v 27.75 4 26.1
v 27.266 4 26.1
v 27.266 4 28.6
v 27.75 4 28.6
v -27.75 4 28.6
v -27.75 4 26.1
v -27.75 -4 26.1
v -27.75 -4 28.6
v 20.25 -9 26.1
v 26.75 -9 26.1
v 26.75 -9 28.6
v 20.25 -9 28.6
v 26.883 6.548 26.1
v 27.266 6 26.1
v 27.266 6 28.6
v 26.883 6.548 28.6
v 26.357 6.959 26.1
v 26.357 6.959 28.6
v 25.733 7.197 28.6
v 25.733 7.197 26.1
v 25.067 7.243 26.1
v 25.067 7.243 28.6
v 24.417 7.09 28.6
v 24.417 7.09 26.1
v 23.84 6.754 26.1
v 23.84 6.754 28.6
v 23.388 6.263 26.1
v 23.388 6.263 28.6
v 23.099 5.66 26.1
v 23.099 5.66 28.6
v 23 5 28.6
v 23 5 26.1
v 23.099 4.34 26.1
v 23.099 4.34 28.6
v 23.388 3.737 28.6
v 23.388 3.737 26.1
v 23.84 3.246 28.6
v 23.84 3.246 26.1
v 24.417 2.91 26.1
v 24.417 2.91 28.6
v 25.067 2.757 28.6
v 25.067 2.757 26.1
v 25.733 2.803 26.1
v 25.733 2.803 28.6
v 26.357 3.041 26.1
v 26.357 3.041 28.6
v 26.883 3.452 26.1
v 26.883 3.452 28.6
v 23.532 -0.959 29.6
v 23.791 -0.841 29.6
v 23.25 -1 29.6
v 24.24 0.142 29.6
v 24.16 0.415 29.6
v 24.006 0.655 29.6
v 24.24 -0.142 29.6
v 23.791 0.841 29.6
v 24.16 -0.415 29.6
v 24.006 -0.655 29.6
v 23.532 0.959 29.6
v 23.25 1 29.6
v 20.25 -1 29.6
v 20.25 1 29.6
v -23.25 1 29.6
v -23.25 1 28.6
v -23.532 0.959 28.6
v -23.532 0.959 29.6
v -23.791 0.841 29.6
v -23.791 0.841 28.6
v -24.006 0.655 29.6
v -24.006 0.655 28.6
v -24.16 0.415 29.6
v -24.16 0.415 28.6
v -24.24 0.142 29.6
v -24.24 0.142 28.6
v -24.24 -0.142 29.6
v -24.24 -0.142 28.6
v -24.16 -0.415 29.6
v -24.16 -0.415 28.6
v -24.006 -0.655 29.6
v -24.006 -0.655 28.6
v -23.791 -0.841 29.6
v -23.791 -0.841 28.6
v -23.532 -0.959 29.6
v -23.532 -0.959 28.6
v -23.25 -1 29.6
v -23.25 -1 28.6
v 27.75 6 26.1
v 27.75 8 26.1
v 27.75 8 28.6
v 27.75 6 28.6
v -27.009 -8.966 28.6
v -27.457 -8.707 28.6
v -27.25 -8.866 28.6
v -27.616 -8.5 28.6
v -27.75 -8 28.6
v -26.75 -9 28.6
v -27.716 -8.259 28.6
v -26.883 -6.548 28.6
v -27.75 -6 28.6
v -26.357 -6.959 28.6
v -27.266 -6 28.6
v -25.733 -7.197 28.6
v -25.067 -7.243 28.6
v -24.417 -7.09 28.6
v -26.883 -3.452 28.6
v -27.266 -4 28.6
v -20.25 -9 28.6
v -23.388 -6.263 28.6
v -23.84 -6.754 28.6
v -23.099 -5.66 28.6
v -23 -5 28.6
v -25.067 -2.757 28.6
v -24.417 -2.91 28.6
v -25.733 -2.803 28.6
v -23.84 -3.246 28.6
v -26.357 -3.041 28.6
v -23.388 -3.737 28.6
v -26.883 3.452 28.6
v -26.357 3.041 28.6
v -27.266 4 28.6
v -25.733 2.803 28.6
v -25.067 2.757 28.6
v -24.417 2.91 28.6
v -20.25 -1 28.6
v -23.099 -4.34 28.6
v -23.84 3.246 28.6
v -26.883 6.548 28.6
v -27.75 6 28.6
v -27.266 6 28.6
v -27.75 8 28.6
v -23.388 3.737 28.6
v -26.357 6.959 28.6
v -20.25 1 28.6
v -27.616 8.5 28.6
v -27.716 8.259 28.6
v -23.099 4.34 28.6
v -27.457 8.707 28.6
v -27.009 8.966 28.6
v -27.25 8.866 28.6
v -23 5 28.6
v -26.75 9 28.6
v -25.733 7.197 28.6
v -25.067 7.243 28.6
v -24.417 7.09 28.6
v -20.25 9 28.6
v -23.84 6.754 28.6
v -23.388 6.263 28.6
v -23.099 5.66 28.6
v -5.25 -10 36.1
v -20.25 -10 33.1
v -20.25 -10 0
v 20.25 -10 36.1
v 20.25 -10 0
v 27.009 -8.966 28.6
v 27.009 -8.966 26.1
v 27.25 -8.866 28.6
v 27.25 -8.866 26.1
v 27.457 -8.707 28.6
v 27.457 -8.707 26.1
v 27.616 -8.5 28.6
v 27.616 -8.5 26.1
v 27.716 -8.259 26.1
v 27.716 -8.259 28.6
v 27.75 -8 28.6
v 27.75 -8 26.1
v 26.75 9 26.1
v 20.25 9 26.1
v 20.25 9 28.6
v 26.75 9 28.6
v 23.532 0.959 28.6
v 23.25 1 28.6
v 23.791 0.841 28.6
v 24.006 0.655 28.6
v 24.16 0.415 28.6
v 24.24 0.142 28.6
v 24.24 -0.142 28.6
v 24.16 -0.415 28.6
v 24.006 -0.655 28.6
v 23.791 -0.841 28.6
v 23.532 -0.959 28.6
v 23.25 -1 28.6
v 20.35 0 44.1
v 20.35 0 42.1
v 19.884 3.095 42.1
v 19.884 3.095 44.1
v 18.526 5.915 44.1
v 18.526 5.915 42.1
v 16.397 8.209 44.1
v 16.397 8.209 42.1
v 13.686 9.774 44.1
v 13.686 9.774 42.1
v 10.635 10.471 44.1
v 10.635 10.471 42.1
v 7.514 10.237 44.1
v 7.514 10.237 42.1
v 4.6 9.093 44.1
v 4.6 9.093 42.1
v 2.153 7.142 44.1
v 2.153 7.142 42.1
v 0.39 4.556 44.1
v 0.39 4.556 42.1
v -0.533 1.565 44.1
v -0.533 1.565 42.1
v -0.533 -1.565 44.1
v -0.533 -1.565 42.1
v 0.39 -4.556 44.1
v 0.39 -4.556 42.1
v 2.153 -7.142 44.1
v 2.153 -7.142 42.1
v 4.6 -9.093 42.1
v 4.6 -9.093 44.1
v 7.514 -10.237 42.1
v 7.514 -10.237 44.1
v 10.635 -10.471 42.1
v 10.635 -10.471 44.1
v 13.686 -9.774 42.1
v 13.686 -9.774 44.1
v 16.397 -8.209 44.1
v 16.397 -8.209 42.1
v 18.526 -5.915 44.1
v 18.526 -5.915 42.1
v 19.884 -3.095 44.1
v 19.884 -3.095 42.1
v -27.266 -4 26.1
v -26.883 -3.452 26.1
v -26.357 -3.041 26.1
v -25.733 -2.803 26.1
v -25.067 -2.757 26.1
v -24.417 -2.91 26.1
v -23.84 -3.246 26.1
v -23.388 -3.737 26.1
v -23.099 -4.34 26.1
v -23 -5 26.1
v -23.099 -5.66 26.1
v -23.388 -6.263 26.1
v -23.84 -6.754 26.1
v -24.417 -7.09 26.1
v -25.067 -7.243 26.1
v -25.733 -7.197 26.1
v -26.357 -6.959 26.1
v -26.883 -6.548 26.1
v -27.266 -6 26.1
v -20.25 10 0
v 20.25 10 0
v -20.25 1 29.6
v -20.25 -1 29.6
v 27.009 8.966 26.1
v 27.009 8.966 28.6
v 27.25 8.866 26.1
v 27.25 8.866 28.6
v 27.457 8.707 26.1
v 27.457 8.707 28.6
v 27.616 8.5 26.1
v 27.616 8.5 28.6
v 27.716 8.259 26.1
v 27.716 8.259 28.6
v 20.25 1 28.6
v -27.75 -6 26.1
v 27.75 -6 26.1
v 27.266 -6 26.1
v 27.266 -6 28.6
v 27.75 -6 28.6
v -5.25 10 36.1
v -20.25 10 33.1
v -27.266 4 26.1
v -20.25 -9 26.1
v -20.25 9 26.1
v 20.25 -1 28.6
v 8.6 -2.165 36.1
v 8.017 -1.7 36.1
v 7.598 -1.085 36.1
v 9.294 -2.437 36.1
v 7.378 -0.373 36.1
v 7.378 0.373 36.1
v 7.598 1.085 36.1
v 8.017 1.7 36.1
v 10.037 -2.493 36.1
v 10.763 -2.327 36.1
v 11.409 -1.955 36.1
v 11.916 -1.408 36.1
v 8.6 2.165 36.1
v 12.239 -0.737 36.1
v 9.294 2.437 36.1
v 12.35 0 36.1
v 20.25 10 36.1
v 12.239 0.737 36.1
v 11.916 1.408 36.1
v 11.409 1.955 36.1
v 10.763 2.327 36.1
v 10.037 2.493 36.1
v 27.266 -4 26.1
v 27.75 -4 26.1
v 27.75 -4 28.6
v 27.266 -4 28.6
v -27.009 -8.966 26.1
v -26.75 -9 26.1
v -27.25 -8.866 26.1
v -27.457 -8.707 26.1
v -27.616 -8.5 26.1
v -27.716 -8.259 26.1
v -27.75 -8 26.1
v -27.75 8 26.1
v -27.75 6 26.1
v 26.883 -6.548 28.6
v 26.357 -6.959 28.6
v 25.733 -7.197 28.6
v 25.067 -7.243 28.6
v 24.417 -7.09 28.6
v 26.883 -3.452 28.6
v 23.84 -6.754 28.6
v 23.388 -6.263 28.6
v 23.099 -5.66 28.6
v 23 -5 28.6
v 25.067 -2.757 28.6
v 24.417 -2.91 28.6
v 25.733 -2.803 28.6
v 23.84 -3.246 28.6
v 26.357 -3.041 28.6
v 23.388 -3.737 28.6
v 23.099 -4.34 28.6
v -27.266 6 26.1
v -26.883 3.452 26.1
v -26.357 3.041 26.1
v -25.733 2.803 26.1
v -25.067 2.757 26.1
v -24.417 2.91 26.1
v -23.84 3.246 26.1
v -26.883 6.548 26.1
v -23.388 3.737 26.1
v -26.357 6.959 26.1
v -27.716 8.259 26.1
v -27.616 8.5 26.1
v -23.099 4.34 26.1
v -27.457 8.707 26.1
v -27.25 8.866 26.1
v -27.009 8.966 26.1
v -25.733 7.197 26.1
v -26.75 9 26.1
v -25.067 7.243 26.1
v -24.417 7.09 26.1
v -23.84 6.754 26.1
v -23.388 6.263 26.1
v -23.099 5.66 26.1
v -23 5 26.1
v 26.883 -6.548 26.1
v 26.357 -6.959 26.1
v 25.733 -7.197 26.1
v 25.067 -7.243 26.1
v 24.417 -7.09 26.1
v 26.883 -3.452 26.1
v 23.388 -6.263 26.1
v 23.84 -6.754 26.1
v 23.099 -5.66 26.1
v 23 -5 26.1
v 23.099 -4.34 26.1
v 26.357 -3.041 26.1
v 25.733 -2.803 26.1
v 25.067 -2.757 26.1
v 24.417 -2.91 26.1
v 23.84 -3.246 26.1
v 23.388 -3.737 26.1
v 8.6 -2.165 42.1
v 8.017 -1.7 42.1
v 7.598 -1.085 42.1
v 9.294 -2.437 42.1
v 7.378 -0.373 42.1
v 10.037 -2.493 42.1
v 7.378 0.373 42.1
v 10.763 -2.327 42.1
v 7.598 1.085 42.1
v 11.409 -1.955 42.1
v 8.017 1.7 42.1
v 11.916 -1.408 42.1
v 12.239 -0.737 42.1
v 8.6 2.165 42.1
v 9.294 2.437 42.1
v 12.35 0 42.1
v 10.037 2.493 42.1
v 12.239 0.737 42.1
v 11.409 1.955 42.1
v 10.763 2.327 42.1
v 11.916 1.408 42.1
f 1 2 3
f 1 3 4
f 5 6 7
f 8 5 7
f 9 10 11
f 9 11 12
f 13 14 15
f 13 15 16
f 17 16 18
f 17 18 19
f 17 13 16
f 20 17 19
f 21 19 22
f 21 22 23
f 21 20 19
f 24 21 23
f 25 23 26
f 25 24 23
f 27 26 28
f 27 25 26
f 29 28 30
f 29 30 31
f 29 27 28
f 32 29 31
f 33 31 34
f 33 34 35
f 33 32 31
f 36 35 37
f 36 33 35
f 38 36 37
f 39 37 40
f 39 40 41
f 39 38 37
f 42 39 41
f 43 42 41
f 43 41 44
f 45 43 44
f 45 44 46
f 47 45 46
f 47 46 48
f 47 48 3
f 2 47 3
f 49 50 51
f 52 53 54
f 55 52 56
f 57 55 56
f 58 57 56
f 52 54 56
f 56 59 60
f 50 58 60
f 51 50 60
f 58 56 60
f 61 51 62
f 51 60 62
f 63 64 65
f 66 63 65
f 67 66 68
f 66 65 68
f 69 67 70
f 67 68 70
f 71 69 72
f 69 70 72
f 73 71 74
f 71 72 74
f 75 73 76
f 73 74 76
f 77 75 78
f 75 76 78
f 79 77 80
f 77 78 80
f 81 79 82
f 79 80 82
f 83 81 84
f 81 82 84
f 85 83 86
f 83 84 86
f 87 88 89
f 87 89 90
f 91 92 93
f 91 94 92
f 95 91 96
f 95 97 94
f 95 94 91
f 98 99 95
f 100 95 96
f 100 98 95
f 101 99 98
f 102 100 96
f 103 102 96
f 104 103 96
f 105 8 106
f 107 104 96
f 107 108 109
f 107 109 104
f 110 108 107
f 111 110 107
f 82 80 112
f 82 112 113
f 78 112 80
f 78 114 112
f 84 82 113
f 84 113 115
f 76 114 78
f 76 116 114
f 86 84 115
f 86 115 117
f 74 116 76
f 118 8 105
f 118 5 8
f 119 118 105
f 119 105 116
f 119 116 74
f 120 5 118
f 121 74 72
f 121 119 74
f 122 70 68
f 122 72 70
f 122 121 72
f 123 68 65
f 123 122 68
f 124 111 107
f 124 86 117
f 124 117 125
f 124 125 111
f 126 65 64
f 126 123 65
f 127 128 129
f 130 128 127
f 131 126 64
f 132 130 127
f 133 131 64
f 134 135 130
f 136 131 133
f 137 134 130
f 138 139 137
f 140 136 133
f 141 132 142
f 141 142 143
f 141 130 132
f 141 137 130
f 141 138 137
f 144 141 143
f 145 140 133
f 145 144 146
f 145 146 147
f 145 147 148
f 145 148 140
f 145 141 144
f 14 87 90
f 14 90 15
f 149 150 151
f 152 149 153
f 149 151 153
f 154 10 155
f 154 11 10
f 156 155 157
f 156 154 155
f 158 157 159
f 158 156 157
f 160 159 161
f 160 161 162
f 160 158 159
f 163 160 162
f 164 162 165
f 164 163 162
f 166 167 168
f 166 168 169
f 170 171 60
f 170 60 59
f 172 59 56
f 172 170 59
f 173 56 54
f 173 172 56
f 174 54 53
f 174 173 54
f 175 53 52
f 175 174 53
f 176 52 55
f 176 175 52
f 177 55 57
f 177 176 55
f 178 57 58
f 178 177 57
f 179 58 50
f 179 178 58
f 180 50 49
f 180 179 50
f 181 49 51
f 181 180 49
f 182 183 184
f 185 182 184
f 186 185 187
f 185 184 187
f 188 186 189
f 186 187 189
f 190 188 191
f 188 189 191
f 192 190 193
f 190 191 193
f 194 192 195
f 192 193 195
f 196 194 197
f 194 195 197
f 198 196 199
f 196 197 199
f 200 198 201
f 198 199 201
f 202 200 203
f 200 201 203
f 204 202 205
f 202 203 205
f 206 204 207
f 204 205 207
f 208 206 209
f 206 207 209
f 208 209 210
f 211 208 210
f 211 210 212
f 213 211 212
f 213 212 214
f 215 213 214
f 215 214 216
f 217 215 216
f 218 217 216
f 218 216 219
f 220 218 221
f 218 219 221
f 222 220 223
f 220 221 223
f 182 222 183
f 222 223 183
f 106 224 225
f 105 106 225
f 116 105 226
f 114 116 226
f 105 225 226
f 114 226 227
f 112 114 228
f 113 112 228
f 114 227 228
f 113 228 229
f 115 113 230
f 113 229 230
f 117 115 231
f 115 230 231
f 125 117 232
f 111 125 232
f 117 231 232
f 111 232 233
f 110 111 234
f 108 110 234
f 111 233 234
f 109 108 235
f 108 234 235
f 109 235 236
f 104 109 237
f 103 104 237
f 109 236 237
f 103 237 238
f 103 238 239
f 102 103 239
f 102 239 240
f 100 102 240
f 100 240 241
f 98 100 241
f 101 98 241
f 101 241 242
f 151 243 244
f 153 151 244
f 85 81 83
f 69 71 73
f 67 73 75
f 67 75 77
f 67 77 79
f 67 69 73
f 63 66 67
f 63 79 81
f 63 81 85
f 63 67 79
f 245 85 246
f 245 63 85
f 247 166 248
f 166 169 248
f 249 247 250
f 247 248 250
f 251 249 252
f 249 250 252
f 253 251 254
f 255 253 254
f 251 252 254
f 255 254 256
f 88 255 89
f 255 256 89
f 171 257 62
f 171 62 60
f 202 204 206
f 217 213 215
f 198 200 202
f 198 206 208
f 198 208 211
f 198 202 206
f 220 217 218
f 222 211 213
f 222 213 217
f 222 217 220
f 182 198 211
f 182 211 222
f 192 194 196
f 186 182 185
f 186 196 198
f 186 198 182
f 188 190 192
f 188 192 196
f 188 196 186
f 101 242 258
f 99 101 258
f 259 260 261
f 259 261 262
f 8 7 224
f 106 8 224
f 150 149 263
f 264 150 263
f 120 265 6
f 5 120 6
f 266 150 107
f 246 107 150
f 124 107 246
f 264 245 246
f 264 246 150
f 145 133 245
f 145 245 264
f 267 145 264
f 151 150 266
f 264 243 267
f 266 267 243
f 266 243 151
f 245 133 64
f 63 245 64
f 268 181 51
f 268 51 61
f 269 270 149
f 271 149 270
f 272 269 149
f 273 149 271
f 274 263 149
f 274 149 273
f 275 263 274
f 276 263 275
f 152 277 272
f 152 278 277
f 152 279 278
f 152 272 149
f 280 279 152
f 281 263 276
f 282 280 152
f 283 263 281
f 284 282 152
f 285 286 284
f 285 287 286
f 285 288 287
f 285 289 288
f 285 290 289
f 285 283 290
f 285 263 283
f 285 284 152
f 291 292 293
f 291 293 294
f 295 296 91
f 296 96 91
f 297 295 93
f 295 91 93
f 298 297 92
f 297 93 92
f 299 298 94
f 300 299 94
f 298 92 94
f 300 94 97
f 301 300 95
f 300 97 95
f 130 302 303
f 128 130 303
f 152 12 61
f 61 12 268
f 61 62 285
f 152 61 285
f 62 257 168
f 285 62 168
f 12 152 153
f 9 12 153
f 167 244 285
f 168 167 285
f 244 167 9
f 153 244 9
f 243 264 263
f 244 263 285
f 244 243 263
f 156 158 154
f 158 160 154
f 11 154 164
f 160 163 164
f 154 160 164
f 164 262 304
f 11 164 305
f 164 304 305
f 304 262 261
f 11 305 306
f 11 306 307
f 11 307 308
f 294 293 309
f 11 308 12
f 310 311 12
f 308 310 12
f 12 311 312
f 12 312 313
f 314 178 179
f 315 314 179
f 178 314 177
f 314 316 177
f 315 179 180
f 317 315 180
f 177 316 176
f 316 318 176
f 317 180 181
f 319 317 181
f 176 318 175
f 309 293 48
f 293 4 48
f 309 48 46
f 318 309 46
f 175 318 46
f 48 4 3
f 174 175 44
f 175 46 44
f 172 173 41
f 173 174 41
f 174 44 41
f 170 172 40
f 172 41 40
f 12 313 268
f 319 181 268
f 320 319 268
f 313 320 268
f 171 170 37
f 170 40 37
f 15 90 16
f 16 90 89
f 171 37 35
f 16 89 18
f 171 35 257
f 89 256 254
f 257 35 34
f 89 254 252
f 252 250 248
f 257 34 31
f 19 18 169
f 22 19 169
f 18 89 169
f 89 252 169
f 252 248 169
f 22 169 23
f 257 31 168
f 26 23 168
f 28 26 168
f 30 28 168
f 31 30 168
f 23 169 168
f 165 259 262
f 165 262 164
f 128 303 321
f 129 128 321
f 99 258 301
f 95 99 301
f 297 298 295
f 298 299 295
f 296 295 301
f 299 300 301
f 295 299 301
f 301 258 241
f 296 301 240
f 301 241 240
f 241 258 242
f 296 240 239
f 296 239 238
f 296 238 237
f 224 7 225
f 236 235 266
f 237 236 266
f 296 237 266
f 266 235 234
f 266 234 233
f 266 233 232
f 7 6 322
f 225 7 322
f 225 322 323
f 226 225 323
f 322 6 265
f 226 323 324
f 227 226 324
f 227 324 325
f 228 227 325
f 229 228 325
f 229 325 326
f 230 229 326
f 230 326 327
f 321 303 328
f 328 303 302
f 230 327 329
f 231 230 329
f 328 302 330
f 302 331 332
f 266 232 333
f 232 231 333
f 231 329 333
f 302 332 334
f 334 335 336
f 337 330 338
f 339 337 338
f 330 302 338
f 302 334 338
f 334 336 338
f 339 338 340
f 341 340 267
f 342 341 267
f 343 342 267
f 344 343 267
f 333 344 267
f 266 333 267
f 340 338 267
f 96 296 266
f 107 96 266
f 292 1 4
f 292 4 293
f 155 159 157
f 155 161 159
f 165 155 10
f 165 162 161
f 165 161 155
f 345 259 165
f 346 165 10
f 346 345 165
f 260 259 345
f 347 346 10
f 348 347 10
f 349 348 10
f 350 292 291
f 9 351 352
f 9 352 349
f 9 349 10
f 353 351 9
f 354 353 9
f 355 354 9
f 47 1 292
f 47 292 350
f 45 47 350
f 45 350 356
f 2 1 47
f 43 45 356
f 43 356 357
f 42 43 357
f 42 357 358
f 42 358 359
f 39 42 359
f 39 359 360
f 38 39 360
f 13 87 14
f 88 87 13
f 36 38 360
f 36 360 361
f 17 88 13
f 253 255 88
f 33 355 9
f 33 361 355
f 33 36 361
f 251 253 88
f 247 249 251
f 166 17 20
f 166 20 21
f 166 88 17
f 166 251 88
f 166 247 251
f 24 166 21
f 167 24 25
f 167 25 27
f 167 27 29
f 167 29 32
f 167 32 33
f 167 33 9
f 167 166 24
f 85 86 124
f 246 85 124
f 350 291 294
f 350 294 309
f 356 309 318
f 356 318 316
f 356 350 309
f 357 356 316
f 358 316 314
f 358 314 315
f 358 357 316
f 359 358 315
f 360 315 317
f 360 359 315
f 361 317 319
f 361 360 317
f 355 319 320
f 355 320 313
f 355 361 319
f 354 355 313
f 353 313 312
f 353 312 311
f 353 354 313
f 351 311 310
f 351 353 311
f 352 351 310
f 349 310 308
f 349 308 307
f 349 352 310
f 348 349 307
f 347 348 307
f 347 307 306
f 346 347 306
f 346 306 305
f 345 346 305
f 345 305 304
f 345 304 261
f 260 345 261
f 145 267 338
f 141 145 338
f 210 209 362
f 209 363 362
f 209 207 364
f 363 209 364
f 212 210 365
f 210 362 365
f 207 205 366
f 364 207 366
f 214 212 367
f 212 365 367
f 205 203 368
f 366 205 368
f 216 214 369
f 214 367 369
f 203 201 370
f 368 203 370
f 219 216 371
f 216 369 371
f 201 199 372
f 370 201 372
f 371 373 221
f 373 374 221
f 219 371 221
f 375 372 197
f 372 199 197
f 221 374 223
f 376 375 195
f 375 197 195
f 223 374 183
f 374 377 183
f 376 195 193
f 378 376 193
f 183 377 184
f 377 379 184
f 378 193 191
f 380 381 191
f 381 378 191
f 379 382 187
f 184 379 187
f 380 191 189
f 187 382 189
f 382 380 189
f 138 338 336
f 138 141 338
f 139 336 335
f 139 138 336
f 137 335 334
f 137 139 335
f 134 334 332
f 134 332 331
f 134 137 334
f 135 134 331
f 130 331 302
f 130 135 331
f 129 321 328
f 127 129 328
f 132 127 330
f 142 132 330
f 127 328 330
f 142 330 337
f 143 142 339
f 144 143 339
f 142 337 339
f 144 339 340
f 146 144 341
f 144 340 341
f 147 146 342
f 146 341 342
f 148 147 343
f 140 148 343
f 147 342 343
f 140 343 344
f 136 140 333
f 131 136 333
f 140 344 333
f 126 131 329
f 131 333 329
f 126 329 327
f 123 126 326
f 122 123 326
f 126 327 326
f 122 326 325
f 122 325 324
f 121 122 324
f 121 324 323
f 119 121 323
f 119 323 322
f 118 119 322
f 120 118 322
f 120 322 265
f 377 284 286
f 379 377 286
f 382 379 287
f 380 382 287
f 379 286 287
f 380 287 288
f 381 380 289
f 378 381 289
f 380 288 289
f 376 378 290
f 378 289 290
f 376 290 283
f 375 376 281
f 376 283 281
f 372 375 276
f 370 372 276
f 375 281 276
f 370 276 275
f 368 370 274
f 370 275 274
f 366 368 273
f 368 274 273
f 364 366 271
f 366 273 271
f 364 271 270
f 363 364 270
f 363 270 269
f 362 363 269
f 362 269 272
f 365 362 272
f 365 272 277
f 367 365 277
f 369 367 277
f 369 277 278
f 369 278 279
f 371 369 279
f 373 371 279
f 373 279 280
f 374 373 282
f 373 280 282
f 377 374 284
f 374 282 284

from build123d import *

# Parameters (mm, degrees)
SKETCH1_W            = 40.5
SKETCH1_H            = 20
BOSS_EXTRUDE1_DEPTH  = 36.1
BOSS_EXTRUDE2_DEPTH  = 2.5
BOSS_EXTRUDE3_DEPTH  = 1
FILLET1_R            = 1
FILLET1_OF_MIRROR1_R = 1
CHAMFER1_SIZE        = 3
CHAMFER1_SIZE2       = 15
SKETCH4_R            = 2.5
BOSS_EXTRUDE4_DEPTH  = 6
SKETCH5_R            = 10.5
BOSS_EXTRUDE5_DEPTH  = 2


with BuildPart() as part:
    # Sketch1 → Boss-Extrude1 (new body)
    with BuildSketch(Plane.XY):
        Rectangle(SKETCH1_W, SKETCH1_H)
    extrude(amount=BOSS_EXTRUDE1_DEPTH)

    # Sketch2 → Boss-Extrude2 (add)
    with BuildSketch(Plane(origin=(0, 0, 26.1), x_dir=(-1, 0, 0), z_dir=(0, 0, -1))):
        with BuildLine():
            Line((-20.25, 9), (-27.75, 9))
            Line((-27.75, 9), (-27.75, 6))
            Line((-27.75, 6), (-27.265564437, 6))
            ThreePointArc((-27.265564437, 6), (-23, 5), (-27.265564437, 4))
            Line((-27.265564437, 4), (-27.75, 4))
            Line((-27.75, 4), (-27.75, -4))
            Line((-27.75, -4), (-27.265564437, -4))
            ThreePointArc((-27.265564437, -4), (-23, -5), (-27.265564437, -6))
            Line((-27.265564437, -6), (-27.75, -6))
            Line((-27.75, -6), (-27.75, -9))
            Line((-27.75, -9), (-20.25, -9))
            Line((-20.25, -9), (-20.25, 9))
        make_face()
    boss_extrude2 = extrude(amount=-BOSS_EXTRUDE2_DEPTH)

    # Sketch3 → Boss-Extrude3 (add)
    with BuildSketch(Plane.XY.offset(28.6)):
        with BuildLine():
            Line((20.25, 1), (23.25, 1))
            ThreePointArc((23.25, 1), (24.25, 0), (23.25, -1))
            Line((23.25, -1), (20.25, -1))
            Line((20.25, -1), (20.25, 1))
        make_face()
    boss_extrude3 = extrude(amount=BOSS_EXTRUDE3_DEPTH)

    # Fillet1
    fillet1_edges = [part.edges().sort_by_distance(p)[0] for p in [
        (27.75, -9, 27.35),
        (27.75, 9, 27.35),
    ]]
    fillet(fillet1_edges, radius=FILLET1_R)

    # Mirror1: Boss-Extrude2, Boss-Extrude3 across plane
    add(boss_extrude2.mirror(Plane(origin=(0, 0, 0), x_dir=(0, 0, 1), z_dir=(1, 0, 0))))
    add(boss_extrude3.mirror(Plane(origin=(0, 0, 0), x_dir=(0, 0, 1), z_dir=(1, 0, 0))))

    # Fillet1 of Mirror1
    fillet1_of_mirror1_edges = [part.edges().sort_by_distance(p)[0] for p in [
        (-27.75, -9, 27.35),
        (-27.75, 9, 27.35),
    ]]
    fillet(fillet1_of_mirror1_edges, radius=FILLET1_OF_MIRROR1_R)

    # Chamfer1
    chamfer1_edges = [part.edges().sort_by_distance(p)[0] for p in [
        (-20.25, 0, 36.1),
    ]]
    chamfer1_side = [part.faces().sort_by_distance(p)[0] for p in [
        (-20.25, 0, 17.397259259),
    ]]
    chamfer(chamfer1_edges, length=CHAMFER1_SIZE, length2=CHAMFER1_SIZE2, reference=chamfer1_side[0])

    # Sketch4 → Boss-Extrude4 (add)
    with BuildSketch(Plane.XY.offset(36.1)):
        with Locations((9.85, 0)):
            Circle(SKETCH4_R)
    extrude(amount=BOSS_EXTRUDE4_DEPTH)

    # Sketch5 → Boss-Extrude5 (add)
    with BuildSketch(Plane.XY.offset(42.1)):
        with Locations((9.85, 0)):
            Circle(SKETCH5_R)
    extrude(amount=BOSS_EXTRUDE5_DEPTH)


solid = part.part
